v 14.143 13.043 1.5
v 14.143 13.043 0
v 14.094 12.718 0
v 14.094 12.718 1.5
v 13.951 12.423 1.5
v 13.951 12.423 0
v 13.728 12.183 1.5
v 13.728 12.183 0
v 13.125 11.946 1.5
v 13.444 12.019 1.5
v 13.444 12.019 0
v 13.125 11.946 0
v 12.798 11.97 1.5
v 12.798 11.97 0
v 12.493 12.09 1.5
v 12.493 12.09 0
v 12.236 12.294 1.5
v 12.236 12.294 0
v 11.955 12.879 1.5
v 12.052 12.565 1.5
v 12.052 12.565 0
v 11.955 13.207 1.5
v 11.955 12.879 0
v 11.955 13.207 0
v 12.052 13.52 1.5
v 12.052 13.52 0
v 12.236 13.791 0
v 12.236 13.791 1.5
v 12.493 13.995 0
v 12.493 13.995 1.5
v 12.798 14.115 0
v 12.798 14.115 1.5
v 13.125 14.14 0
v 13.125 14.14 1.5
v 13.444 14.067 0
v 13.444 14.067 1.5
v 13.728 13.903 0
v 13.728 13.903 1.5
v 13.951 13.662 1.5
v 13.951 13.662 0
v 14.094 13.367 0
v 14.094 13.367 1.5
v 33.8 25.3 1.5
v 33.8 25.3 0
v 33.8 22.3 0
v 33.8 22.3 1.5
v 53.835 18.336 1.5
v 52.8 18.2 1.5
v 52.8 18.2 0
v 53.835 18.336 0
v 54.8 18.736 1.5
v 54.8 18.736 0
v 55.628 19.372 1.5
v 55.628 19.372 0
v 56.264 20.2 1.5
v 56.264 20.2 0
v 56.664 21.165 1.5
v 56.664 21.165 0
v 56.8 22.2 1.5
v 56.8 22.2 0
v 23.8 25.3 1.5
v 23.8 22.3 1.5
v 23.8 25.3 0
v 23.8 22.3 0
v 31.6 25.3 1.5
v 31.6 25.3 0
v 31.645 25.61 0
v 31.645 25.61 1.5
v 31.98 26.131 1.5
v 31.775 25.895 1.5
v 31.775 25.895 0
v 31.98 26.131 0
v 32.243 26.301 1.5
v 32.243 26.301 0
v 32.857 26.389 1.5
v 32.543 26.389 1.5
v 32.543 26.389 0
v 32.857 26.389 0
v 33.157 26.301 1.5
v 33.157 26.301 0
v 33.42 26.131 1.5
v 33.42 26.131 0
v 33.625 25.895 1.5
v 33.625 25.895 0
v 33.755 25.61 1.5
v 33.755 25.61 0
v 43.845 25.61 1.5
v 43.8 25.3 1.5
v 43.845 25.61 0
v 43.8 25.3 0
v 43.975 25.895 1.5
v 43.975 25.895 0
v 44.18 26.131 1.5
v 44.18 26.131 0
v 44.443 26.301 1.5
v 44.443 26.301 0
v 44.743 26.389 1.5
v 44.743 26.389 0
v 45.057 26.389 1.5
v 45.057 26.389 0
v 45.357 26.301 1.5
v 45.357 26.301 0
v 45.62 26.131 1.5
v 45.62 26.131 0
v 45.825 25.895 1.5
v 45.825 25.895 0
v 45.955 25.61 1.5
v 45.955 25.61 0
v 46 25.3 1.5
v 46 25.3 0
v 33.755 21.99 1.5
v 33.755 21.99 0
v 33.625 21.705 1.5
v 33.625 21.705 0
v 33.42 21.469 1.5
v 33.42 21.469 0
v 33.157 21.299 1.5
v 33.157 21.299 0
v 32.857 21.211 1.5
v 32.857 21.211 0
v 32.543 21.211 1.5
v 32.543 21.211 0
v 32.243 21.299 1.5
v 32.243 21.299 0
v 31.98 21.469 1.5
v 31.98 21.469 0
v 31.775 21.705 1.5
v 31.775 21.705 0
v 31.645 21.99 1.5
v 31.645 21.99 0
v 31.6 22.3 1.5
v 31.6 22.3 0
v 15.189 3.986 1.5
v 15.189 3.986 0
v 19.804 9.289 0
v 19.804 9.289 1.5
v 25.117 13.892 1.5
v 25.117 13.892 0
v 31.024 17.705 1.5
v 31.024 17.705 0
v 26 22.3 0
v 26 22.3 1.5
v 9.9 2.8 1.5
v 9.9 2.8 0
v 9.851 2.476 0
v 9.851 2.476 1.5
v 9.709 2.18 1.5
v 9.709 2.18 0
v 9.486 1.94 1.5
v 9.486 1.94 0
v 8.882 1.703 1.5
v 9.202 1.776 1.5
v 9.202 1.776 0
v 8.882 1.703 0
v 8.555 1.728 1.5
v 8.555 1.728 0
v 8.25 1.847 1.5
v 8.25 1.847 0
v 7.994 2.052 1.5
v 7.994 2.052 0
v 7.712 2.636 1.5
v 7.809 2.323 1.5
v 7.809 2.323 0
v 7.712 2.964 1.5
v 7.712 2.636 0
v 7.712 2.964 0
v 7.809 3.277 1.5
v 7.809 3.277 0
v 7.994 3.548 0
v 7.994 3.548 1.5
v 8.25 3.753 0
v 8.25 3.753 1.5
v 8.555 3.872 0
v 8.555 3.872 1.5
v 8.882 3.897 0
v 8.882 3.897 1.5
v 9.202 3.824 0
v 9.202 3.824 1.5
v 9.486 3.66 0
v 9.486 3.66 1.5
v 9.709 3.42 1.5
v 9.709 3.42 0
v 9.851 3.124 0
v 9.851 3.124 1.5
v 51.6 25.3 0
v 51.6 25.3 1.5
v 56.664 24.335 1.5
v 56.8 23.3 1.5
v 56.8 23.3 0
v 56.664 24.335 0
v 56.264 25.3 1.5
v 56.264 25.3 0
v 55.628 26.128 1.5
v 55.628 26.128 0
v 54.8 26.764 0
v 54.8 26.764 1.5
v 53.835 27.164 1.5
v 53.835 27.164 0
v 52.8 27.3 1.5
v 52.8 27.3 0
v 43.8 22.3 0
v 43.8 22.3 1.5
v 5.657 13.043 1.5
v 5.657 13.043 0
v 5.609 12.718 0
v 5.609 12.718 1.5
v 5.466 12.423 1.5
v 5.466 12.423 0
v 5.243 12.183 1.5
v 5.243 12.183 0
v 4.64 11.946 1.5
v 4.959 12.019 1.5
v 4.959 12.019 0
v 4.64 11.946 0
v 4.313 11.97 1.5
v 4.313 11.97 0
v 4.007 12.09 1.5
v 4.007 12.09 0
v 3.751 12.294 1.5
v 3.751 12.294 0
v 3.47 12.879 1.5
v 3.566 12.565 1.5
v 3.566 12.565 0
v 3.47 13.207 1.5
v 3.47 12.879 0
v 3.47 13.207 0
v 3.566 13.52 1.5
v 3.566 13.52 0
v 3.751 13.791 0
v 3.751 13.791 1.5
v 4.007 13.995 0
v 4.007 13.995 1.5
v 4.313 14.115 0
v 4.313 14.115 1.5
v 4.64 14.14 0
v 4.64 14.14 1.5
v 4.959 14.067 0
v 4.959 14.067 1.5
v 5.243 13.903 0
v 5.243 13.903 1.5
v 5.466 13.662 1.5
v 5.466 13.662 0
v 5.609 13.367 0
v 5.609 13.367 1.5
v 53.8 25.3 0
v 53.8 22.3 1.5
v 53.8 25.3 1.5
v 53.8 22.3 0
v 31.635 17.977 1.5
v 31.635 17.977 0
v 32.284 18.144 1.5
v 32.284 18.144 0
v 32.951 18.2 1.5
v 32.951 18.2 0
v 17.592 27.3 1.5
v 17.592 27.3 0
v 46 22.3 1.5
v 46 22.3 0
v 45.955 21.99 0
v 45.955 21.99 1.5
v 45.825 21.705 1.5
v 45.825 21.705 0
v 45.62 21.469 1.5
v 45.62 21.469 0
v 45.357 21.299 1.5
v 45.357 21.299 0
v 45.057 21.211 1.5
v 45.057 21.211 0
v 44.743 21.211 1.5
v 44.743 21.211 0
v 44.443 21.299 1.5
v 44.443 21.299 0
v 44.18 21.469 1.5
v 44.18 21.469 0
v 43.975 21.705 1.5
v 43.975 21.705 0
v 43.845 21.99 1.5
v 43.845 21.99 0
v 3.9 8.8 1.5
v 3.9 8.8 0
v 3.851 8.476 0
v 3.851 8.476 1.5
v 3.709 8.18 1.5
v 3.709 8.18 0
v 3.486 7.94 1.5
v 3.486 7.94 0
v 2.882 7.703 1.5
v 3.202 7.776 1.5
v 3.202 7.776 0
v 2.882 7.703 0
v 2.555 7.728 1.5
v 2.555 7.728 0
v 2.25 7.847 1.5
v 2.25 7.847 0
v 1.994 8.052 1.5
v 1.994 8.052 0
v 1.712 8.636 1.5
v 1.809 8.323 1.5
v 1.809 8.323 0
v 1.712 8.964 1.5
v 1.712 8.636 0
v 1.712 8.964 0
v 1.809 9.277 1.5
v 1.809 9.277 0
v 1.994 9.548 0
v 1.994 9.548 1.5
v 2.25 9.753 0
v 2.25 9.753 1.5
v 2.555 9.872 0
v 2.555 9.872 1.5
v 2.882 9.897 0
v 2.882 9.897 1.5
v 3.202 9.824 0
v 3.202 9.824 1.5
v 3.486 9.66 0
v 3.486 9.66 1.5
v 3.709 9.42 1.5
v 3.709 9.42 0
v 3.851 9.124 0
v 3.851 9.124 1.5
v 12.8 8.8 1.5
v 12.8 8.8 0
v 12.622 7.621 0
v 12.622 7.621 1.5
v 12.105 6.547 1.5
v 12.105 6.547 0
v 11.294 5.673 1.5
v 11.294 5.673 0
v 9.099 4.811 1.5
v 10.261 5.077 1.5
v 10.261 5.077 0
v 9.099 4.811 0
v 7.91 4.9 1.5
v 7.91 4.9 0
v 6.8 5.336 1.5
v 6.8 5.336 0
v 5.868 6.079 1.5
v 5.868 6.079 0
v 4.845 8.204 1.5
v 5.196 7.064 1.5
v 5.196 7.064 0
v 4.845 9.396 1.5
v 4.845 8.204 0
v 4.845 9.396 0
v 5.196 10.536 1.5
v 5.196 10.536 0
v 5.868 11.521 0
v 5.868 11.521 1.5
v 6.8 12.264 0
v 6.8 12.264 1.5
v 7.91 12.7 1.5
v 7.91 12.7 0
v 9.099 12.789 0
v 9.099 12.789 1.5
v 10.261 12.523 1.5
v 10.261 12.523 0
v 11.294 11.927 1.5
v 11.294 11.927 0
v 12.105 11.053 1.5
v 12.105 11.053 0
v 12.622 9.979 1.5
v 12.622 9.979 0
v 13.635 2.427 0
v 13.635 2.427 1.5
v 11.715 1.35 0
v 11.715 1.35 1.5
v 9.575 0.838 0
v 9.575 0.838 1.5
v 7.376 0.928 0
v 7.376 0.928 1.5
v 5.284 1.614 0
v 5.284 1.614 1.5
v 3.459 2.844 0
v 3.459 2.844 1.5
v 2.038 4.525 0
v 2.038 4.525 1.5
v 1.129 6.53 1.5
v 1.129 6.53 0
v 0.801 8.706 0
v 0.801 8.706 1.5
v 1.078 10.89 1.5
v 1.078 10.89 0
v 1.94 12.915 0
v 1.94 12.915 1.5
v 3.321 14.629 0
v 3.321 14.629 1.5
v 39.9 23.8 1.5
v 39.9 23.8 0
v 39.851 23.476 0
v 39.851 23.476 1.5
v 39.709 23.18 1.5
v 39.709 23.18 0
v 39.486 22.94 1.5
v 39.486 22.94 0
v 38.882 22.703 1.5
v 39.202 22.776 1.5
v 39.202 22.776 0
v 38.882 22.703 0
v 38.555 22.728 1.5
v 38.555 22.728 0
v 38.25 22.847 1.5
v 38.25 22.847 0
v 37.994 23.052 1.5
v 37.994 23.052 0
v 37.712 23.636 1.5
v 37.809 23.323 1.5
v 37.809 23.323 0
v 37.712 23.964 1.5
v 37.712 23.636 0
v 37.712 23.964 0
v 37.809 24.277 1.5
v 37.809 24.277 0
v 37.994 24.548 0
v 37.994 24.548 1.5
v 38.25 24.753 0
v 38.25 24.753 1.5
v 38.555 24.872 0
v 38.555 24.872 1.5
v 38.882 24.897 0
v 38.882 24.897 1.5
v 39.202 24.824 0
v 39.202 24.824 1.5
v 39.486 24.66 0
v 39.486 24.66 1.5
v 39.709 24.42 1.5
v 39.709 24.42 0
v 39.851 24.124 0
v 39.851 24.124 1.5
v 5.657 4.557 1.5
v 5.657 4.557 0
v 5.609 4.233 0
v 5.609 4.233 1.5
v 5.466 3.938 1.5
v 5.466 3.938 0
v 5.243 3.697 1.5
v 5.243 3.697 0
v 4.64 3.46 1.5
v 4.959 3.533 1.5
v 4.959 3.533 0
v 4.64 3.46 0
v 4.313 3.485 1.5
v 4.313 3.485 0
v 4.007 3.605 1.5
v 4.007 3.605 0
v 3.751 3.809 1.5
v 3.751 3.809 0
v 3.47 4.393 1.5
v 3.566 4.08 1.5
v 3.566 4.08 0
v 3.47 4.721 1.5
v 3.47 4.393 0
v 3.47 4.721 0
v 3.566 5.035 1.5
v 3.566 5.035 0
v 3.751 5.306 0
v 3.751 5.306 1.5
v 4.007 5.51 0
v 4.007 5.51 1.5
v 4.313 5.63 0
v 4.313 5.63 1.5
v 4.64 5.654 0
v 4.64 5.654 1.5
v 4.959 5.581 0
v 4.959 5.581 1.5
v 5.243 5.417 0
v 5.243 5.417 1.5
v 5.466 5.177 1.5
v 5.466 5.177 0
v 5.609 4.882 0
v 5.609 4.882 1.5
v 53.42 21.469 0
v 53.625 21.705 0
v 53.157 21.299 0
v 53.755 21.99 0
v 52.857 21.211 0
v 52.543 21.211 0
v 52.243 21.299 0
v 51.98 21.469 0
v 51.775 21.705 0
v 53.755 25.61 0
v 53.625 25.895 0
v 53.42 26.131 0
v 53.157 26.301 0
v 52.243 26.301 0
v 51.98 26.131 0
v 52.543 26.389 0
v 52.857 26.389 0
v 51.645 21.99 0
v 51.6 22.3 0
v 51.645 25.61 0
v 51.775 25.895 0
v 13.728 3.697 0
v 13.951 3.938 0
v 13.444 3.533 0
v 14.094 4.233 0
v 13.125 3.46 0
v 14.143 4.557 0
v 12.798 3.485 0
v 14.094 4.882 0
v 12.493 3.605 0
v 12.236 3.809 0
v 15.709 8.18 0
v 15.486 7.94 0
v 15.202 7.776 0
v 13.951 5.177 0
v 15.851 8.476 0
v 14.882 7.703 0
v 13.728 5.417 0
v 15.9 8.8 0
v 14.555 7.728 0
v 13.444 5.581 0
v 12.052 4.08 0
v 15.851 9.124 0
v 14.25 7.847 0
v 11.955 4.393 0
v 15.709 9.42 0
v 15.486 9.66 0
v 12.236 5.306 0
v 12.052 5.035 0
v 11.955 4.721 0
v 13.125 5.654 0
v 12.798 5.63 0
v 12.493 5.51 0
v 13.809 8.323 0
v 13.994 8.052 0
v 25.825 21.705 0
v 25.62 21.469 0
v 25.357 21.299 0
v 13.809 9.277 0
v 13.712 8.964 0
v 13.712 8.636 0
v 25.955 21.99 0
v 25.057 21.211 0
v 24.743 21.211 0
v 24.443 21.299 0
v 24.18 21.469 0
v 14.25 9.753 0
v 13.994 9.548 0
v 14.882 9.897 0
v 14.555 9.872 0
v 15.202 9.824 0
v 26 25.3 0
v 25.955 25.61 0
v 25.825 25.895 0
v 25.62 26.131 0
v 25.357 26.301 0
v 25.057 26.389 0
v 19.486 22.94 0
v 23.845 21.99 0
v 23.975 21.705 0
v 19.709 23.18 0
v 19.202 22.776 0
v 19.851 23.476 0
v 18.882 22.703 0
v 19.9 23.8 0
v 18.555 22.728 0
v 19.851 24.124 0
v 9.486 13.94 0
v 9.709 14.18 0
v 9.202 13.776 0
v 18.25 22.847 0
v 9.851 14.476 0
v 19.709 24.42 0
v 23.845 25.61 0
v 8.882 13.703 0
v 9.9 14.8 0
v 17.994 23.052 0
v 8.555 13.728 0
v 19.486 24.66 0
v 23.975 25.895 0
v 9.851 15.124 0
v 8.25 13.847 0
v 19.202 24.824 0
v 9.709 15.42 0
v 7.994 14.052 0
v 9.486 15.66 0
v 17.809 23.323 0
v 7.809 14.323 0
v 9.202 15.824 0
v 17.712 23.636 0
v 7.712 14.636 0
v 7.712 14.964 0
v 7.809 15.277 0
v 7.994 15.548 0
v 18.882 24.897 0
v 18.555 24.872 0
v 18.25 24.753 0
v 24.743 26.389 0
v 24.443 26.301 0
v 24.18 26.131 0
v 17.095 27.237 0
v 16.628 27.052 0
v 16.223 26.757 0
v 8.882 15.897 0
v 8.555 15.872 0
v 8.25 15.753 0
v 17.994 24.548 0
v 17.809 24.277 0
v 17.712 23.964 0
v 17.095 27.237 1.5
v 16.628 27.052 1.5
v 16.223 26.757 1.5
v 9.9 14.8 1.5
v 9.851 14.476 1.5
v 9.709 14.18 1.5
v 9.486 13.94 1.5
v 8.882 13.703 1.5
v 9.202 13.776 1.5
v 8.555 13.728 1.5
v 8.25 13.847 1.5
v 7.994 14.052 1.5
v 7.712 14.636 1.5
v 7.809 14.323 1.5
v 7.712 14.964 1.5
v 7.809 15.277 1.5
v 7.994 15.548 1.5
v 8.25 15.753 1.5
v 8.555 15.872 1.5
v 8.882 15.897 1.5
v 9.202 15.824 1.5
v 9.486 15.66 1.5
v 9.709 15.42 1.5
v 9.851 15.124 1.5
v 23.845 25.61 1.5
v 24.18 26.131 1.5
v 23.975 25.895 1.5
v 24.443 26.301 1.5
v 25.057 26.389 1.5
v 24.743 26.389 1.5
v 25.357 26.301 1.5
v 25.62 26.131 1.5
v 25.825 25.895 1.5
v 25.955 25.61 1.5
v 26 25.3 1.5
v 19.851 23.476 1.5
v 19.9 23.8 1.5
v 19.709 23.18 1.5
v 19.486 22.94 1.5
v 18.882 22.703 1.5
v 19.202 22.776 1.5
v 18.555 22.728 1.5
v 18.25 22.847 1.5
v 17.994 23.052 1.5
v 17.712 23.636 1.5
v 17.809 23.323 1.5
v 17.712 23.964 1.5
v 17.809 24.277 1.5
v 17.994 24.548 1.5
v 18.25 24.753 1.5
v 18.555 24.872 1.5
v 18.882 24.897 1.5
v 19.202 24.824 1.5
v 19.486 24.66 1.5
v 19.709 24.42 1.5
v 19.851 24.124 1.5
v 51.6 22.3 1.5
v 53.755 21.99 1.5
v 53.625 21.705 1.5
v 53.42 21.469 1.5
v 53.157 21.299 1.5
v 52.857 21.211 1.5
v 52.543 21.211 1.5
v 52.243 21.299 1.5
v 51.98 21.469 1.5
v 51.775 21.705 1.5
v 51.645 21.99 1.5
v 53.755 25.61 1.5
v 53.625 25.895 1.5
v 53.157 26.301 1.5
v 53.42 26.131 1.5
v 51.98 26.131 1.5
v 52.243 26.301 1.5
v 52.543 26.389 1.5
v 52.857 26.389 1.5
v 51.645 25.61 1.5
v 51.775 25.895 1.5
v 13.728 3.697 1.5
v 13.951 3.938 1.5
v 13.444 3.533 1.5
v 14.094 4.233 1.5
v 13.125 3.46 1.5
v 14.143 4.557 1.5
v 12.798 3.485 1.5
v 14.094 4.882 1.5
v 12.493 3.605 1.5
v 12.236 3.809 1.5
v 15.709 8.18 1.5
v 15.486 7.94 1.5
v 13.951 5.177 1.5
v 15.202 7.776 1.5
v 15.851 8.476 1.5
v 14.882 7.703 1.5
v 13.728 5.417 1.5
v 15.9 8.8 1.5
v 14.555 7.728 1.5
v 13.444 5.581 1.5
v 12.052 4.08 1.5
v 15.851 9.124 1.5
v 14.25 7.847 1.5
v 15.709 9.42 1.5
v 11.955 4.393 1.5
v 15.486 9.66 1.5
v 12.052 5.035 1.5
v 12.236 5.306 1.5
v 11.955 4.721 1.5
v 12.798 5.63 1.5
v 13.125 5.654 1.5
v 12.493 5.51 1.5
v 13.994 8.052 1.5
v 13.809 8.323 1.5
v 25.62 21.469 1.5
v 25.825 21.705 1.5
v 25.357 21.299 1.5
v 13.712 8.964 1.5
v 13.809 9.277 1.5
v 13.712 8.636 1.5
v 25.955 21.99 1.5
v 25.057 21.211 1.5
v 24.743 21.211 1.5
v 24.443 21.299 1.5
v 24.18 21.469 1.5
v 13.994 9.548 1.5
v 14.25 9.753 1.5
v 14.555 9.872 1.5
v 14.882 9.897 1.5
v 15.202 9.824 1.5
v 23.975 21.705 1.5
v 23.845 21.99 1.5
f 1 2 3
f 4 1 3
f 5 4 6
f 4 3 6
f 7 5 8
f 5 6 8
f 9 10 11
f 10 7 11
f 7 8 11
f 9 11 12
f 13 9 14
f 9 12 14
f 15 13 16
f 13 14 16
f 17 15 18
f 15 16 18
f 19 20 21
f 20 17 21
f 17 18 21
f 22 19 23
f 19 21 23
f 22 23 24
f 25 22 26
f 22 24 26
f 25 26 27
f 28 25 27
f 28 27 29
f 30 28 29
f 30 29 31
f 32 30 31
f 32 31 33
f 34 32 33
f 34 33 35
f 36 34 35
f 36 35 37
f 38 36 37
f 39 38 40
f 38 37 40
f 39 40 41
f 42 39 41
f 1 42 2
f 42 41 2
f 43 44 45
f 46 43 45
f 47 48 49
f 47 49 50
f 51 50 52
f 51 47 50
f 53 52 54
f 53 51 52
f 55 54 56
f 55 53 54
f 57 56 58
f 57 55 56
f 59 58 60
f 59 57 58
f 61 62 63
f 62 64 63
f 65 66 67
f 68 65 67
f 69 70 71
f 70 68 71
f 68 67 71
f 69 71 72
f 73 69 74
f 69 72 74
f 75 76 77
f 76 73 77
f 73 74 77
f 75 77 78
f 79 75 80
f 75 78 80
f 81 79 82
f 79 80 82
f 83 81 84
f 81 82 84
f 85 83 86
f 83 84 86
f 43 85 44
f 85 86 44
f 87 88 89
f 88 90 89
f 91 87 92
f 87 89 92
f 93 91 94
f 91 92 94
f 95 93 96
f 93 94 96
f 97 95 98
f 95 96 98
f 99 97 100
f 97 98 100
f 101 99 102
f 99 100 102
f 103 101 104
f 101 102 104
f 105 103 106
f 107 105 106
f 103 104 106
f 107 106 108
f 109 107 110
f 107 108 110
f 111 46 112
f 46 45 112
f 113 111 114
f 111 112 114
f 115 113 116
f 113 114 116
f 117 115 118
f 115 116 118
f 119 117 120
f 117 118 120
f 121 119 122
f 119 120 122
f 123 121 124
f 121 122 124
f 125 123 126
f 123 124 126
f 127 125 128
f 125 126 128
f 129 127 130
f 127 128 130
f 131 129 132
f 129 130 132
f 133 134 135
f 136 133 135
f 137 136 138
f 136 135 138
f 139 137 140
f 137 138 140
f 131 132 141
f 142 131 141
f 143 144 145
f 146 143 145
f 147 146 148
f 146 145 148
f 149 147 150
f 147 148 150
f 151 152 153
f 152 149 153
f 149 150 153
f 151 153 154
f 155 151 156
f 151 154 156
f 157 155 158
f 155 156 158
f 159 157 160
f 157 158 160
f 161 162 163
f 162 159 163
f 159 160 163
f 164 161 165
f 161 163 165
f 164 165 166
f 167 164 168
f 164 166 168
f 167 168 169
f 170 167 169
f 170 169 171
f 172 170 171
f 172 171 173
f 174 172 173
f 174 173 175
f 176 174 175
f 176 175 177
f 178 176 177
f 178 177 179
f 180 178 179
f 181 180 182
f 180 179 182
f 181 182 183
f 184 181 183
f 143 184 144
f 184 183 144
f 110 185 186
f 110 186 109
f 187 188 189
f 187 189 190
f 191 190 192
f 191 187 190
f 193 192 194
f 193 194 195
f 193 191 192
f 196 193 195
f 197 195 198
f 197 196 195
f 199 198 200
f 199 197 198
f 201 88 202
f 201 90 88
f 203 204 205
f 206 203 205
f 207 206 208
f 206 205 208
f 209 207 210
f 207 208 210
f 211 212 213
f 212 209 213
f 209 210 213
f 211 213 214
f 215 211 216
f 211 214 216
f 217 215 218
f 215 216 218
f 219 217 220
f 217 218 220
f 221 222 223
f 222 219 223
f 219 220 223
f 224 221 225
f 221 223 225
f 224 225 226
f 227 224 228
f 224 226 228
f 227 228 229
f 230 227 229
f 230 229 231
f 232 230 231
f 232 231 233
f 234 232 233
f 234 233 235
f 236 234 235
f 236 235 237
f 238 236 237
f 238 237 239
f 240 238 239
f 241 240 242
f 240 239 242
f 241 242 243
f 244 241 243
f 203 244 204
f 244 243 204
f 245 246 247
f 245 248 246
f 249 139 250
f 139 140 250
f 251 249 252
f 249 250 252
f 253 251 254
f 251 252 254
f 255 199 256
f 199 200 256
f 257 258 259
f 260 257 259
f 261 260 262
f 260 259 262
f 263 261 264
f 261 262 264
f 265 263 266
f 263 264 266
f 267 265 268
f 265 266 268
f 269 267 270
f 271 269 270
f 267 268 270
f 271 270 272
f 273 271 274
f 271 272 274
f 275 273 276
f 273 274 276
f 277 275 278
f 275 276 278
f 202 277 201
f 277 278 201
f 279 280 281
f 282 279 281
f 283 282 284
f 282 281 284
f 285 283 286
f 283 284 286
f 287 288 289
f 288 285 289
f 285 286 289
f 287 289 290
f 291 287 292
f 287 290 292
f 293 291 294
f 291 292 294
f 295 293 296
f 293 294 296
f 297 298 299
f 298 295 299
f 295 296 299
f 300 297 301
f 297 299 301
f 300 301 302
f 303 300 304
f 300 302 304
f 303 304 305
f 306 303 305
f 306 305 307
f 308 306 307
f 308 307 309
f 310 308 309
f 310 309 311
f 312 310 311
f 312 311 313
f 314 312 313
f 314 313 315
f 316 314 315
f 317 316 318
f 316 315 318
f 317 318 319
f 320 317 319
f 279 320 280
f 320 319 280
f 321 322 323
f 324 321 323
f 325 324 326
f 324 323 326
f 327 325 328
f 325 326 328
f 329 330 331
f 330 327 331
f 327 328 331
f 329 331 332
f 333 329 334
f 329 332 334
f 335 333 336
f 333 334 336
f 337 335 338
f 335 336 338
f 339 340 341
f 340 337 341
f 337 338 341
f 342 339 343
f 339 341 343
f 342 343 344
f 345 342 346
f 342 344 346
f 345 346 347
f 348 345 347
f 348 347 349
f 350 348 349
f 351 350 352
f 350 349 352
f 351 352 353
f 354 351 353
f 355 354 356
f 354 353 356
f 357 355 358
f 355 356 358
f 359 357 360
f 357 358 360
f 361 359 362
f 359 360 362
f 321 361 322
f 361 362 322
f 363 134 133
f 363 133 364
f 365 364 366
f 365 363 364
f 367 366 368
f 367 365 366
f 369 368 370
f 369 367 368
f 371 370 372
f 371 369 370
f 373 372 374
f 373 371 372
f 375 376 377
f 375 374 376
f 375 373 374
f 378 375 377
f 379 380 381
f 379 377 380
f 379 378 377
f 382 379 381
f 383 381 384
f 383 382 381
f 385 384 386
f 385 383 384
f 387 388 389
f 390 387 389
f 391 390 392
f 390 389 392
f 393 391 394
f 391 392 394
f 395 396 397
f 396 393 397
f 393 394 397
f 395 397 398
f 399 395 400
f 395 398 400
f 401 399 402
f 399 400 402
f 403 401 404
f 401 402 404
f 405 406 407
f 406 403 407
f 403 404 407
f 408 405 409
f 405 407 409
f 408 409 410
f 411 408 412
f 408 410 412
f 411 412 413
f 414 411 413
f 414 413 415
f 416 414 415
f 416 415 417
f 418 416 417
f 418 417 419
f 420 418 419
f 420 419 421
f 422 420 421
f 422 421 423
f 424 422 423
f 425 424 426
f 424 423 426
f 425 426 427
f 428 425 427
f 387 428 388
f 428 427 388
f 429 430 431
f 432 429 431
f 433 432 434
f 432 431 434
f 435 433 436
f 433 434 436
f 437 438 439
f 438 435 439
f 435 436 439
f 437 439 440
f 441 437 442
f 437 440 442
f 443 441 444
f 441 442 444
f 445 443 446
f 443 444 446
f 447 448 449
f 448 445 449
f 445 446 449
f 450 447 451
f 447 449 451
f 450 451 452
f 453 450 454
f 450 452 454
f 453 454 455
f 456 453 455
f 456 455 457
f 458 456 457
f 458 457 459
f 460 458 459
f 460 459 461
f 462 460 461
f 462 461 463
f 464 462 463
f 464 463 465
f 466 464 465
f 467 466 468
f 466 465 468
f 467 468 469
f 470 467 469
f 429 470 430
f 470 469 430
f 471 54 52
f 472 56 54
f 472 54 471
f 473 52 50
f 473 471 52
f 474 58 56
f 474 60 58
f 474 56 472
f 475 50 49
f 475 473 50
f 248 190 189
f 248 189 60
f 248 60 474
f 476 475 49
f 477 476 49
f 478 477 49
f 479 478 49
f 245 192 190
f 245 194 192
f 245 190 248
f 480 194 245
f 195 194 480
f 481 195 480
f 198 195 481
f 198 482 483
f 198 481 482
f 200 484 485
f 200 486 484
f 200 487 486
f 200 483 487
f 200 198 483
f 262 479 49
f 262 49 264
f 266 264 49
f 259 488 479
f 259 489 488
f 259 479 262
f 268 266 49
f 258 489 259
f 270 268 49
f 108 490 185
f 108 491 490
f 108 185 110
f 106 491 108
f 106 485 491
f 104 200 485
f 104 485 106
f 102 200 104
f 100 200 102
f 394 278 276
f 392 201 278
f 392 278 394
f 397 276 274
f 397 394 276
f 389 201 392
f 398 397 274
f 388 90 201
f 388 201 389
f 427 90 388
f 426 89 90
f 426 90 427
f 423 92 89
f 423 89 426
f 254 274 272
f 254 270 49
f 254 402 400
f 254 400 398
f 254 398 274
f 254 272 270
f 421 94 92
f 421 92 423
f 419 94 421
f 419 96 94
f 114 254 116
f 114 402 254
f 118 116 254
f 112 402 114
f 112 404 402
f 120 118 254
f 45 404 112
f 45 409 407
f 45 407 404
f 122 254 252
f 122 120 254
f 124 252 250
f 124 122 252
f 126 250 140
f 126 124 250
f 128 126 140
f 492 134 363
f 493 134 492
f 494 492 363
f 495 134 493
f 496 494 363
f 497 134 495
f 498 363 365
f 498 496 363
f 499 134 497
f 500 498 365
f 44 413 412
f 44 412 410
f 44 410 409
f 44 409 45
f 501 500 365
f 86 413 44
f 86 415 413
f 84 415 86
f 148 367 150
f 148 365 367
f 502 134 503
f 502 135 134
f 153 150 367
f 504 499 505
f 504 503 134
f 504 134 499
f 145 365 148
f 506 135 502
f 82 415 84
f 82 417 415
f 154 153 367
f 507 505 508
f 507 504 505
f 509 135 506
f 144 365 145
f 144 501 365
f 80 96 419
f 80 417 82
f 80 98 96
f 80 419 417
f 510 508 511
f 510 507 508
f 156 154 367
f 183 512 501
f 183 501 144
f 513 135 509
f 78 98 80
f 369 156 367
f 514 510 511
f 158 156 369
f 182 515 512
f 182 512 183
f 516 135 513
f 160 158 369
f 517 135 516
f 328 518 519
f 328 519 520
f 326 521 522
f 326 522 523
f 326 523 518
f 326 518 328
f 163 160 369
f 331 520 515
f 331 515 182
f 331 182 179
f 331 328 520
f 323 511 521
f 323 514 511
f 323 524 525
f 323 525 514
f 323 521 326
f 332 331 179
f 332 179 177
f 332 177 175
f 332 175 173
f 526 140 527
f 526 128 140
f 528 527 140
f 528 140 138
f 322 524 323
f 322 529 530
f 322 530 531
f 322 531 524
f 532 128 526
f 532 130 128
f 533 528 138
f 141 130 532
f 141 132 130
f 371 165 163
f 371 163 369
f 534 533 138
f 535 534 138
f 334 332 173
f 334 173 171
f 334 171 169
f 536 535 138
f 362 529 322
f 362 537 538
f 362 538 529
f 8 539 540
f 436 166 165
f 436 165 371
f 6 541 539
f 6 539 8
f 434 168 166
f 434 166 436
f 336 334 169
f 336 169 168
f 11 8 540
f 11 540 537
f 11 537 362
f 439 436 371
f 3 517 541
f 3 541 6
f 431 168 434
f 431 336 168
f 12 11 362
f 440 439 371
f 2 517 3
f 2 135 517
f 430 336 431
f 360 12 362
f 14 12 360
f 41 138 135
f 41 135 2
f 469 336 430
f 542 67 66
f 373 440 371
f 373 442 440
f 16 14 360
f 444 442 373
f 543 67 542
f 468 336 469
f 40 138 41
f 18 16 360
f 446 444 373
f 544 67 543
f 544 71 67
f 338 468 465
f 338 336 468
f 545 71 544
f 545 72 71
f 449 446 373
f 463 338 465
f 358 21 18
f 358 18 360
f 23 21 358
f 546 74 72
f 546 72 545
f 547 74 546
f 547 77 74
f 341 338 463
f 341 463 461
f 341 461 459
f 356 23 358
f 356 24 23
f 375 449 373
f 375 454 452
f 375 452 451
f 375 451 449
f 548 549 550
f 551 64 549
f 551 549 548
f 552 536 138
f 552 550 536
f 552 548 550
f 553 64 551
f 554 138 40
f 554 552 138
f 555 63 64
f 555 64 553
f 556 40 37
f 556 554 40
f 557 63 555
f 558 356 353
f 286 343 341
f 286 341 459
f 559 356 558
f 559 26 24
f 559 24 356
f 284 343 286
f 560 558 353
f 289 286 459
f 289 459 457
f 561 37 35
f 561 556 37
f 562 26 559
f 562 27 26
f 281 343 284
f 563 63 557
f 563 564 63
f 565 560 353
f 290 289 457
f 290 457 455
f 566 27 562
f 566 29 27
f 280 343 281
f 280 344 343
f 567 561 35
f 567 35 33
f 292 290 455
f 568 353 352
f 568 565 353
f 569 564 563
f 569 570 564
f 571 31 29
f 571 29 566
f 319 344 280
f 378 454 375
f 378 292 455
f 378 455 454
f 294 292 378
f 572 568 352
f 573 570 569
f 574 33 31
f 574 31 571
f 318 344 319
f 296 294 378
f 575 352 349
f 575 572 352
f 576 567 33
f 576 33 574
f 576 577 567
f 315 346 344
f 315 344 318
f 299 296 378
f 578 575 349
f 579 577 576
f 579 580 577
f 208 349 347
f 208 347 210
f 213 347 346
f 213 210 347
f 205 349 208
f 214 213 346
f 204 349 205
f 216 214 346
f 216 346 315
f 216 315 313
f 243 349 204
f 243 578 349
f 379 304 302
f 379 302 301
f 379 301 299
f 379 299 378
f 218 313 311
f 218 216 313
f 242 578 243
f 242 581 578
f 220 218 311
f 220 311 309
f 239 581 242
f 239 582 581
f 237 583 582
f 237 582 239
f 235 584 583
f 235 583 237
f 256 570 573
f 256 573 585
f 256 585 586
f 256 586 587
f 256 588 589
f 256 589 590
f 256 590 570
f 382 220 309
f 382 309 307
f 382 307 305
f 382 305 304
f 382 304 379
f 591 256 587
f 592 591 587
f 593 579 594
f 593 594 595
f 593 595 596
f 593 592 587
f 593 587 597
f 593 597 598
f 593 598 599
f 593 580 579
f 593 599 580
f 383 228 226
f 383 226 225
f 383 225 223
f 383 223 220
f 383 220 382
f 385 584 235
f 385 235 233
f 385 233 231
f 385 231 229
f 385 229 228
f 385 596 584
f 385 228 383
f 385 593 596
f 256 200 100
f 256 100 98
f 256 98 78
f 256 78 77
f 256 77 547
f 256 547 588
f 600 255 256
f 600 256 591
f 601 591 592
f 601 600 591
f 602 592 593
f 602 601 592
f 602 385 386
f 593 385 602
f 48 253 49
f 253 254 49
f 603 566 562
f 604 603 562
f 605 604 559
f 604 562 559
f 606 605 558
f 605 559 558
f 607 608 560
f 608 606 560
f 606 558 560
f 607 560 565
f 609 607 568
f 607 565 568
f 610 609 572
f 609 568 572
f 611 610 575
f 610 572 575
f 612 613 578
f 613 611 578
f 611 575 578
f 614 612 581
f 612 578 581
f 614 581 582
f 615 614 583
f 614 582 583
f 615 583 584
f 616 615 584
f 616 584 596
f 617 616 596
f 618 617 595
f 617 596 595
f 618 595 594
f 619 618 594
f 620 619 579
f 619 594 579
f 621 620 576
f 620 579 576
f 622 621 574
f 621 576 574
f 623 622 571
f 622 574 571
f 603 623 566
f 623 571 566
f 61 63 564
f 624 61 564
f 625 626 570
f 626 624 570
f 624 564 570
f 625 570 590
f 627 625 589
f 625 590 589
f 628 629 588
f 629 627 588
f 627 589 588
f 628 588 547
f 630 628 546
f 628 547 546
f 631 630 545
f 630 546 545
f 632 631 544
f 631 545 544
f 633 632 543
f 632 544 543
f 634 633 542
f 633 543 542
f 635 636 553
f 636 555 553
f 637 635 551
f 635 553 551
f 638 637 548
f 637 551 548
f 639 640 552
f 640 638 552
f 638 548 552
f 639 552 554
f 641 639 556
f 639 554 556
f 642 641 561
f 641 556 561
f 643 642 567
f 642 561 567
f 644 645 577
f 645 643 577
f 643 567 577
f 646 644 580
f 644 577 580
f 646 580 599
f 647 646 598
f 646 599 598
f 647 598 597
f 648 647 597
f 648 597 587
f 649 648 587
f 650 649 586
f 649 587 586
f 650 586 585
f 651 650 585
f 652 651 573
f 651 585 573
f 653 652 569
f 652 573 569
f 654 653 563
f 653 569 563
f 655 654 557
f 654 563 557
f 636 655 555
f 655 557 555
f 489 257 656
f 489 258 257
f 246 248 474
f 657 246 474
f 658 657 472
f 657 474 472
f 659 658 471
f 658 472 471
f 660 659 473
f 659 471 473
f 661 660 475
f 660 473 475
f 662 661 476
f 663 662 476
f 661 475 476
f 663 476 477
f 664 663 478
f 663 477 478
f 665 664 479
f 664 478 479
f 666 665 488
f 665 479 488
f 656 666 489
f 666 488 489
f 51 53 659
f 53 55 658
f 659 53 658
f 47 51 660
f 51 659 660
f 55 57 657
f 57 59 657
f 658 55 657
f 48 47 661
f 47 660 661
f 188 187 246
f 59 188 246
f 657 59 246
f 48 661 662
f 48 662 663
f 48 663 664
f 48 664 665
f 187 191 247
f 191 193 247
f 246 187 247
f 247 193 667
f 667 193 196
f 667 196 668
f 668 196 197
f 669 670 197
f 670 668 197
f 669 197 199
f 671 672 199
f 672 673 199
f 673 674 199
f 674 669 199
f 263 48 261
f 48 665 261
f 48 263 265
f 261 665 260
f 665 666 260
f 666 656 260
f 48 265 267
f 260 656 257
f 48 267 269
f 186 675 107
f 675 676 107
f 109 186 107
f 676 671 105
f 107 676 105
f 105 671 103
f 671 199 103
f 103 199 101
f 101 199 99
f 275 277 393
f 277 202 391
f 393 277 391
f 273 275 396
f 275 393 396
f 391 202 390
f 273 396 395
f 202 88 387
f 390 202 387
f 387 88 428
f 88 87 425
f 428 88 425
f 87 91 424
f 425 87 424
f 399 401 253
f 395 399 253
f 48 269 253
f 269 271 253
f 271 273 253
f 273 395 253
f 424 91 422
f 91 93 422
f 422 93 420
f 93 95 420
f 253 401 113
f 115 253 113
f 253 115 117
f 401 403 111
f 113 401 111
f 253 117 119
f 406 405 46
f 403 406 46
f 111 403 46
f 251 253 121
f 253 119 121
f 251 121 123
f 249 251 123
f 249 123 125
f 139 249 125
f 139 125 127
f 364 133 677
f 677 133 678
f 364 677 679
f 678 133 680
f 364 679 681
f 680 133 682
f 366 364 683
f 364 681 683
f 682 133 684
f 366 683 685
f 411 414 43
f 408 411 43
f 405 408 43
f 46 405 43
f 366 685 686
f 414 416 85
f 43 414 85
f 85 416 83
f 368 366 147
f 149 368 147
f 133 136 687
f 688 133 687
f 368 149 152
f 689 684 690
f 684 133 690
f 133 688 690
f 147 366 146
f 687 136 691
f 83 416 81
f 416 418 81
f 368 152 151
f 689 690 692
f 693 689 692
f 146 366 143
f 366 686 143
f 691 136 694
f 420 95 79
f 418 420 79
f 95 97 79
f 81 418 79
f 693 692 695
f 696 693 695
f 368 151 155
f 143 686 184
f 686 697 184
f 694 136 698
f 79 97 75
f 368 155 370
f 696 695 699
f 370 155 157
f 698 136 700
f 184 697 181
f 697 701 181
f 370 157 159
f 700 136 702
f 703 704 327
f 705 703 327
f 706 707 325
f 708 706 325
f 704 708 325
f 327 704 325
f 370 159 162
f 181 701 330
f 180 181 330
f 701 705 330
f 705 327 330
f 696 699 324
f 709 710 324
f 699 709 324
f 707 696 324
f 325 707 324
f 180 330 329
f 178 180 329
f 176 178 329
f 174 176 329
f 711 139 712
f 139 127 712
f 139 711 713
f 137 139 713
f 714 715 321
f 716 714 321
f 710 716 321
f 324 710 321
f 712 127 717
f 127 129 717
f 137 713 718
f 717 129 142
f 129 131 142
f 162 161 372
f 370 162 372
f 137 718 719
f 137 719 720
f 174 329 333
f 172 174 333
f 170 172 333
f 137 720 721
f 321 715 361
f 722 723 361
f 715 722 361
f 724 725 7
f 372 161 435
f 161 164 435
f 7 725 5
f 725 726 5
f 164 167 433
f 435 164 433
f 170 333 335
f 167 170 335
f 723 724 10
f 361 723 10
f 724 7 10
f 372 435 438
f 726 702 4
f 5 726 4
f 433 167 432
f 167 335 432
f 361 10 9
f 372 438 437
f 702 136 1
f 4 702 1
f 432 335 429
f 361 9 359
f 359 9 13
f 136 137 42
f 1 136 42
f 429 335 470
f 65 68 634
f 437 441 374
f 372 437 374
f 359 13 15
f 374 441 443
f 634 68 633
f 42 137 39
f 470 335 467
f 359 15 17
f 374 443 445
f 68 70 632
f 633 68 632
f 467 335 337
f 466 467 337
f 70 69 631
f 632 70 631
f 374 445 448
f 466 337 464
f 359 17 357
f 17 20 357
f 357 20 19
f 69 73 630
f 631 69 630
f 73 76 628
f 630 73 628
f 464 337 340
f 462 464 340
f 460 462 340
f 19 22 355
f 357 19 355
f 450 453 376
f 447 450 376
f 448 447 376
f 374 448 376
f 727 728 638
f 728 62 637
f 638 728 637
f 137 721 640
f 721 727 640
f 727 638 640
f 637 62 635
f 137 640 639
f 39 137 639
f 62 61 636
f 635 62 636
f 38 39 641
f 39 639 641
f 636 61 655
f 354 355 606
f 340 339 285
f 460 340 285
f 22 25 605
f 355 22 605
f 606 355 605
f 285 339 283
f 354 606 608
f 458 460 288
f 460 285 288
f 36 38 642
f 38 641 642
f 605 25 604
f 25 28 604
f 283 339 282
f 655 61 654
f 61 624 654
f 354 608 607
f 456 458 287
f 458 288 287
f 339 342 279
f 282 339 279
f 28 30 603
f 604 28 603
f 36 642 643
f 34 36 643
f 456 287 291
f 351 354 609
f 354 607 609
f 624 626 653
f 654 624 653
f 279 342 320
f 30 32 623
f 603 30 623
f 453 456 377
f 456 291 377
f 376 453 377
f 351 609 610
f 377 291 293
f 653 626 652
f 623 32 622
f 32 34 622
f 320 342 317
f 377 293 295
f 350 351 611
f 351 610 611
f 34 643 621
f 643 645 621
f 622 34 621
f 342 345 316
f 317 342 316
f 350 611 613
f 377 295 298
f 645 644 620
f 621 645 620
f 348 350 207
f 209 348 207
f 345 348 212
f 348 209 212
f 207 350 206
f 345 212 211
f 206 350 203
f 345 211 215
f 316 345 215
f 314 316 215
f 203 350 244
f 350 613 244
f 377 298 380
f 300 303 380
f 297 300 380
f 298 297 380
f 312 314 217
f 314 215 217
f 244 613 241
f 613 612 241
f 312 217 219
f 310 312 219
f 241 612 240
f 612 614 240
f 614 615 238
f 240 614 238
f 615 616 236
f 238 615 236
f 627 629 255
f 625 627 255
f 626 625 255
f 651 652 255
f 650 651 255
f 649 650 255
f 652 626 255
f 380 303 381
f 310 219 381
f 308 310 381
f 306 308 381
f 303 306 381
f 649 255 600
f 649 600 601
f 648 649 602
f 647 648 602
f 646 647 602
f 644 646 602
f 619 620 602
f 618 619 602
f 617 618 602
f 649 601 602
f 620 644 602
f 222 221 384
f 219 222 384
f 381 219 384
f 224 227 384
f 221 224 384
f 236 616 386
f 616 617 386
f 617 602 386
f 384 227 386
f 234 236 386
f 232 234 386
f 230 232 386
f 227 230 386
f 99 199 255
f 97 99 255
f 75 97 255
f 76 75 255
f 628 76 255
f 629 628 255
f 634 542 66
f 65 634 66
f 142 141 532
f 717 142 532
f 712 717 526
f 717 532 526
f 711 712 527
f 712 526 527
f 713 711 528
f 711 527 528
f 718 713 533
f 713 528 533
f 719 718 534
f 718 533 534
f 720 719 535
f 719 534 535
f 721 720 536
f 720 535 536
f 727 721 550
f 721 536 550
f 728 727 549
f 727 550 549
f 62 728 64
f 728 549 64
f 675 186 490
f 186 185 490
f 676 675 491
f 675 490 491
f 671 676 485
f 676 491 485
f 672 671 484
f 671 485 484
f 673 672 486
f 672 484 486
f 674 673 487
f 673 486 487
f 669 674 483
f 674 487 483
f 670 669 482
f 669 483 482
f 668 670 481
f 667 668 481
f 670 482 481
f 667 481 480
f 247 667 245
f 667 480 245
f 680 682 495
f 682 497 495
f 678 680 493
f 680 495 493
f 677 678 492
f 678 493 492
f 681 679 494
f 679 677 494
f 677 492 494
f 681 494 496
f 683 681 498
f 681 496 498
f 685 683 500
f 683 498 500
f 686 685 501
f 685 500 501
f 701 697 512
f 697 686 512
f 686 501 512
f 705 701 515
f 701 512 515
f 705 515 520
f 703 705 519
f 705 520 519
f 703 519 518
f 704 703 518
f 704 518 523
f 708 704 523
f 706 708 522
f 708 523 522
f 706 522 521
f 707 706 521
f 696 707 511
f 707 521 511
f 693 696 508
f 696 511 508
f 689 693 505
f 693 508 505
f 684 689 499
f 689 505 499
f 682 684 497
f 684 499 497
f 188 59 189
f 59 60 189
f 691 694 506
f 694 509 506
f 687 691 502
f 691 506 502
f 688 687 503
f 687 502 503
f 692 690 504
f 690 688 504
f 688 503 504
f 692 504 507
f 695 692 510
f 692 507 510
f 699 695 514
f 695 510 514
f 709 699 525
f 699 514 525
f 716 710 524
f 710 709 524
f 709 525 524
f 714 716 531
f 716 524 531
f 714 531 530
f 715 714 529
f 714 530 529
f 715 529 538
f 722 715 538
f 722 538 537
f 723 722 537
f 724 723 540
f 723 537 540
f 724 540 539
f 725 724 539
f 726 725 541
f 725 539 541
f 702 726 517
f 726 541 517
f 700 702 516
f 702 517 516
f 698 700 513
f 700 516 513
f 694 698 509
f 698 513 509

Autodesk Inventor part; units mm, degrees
ref_plane "YZ Plane" through (0, 0, 0) normal (1, 0, 0) x (0, 1, 0)
ref_plane "XZ Plane" through (0, 0, 0) normal (0, 1, 0) x (-1, 0, 0)
ref_plane "XY Plane" through (0, 0, 0) normal (0, 0, 1) x (1, 0, 0)
sketch "スケッチ1" plane through (0, 0, 0) normal (0, 0, 1) x (1, 0, 0)
  circle A0 centre (8.8, 8.8) radius 8 projected
  circle A1 centre (2.8, 8.8) radius 0.825 projected
  circle A2 centre (4.5574, 4.5574) radius 0.825 projected
  circle A3 centre (8.8, 2.8) radius 0.825 projected
  circle A4 centre (13.0426, 4.5574) radius 0.825 projected
  circle A5 centre (14.8, 8.8) radius 0.825 projected
  circle A6 centre (13.0426, 13.0426) radius 0.825 projected
  circle A7 centre (8.8, 14.8) radius 0.825 projected
  circle A8 centre (4.5574, 13.0426) radius 0.825 projected
  circle A9 centre (8.8, 8.8) radius 4 projected
  circle A10 centre (8.8, 14.8) radius 1.1
  circle A11 centre (4.5574, 13.0426) radius 1.1
  circle A12 centre (2.8, 8.8) radius 1.1
  circle A13 centre (4.5574, 4.5574) radius 1.1
  circle A14 centre (8.8, 2.8) radius 1.1
  circle A15 centre (13.0426, 4.5574) radius 1.1
  circle A16 centre (14.8, 8.8) radius 1.1
  circle A17 centre (13.0426, 13.0426) radius 1.1
  line L0 (3.3206, 14.6289) -> (16.8, 27.3)
  line L1 (23.8, 25.3) -> (33.8, 25.3)
  line L2 (33.8, 25.3) -> (33.8, 22.3)
  line L3 (33.8, 22.3) -> (23.8, 22.3)
  line L4 (23.8, 22.3) -> (23.8, 25.3)
  circle A18 centre (24.9, 25.3) radius 1.1
  line L5 (28.8, 25.3) -> (28.8, 22.3) construction
  line L6 (28.8, 23.8) -> (23.8, 23.8) construction
  circle A19 centre (24.9, 22.3) radius 1.1
  circle A20 centre (32.7, 25.3) radius 1.1
  circle A21 centre (32.7, 22.3) radius 1.1
  circle A22 centre (38.8, 23.8) radius 1.1
  circle A23 centre (18.8, 23.8) radius 1.1
  line L7 (16.8, 27.3) -> (40.8, 27.3)
  line L8 (40.8, 27.3) -> (40.8, 21.8)
  arc A24 (40.8, 21.8) -> (15.1891, 3.9855) centre (55.1209, -26.1052) ccw
  point P0 (0, 0)
  point P1 (31.6, 22.3)
  point P2 (26, 22.3)
  point P3 (26, 25.3)
  point P4 (31.6, 25.3)
  dimension "d7" = 2.2
  dimension "d0" = 2.2
  dimension "d3" = 360
  dimension "d5" = 10
  dimension "d6" = 3
  dimension "d8" = 2.2
  dimension "d9" = 5
  dimension "d10" = 2
  dimension "d11" = 2
  dimension "d12" = 2
  dimension "d13" = 20
  dimension "d14" = 2
  dimension "d15" = 15
  dimension "d16" = 50
extrude "押し出し1" add sketch "スケッチ1" along normal blind 1.5 contours A0 | A0 L0 L7 L8 A24
fillet "フィレット1" radius 2 3 edges at (40.8, 27.3, 0.75) (40.8, 21.8, 0.75) (16.8, 27.3, 0.75)
sketch "スケッチ4" plane through (0, 0, 0) normal (0, 0, -1) x (-1, 0, 0)
  line L0 (-53.8, 25.3) -> (-43.8, 25.3)
  line L1 (-43.8, 25.3) -> (-43.8, 22.3)
  line L2 (-43.8, 22.3) -> (-53.8, 22.3)
  line L3 (-53.8, 22.3) -> (-53.8, 25.3)
  circle A0 centre (-38.8, 23.8) radius 1.1 projected
  circle A1 centre (-52.7, 25.3) radius 1.1
  line L4 (-48.8, 25.3) -> (-48.8, 23.8) construction
  line L5 (-48.8, 23.8) -> (-53.8, 23.8) construction
  circle A2 centre (-44.9, 25.3) radius 1.1
  circle A3 centre (-52.7, 22.3) radius 1.1
  circle A4 centre (-44.9, 22.3) radius 1.1
  arc A5 (-15.1891, 3.9855) -> (-39.4277, 21.3682) centre (-55.1209, -26.1052) ccw projected
  line L6 (-31.9466, 18.2) -> (-56.8, 18.2)
  line L7 (-56.8, 18.2) -> (-56.8, 27.3)
  line L8 (-38.8, 27.3) -> (-17.5925, 27.3) construction
  line L9 (-56.8, 27.3) -> (-38.8, 27.3)
  arc A6 (-16.2226, 26.7572) -> (-17.5925, 27.3) centre (-17.5925, 25.3) ccw projected
  line L10 (-38.8, 27.3) -> (-17.5925, 27.3) projected
  arc A7 (-38.8, 27.3) -> (-40.8, 25.3) centre (-38.8, 25.3) ccw projected
  line L11 (-40.8, 23.2671) -> (-40.8, 25.3) projected
  arc A8 (-40.8, 23.2671) -> (-39.4277, 21.3682) centre (-38.8, 23.2671) ccw projected
  arc A9 (-15.1891, 3.9855) -> (-39.4277, 21.3682) centre (-55.1209, -26.1052) ccw construction
  arc A10 (-15.1891, 3.9855) -> (-3.3206, 14.6289) centre (-8.8, 8.8) ccw projected
  line L12 (-16.2226, 26.7572) -> (-3.3206, 14.6289) projected
  circle A11 centre (-8.8, 8.8) radius 4 projected
  circle A12 centre (-8.8, 14.8) radius 1.1 projected
  circle A13 centre (-4.5574, 13.0426) radius 1.1 projected
  circle A14 centre (-2.8, 8.8) radius 1.1 projected
  circle A15 centre (-4.5574, 4.5574) radius 1.1 projected
  circle A16 centre (-8.8, 2.8) radius 1.1 projected
  circle A17 centre (-13.0426, 4.5574) radius 1.1 projected
  circle A18 centre (-14.8, 8.8) radius 1.1 projected
  circle A19 centre (-13.0426, 13.0426) radius 1.1 projected
  circle A20 centre (-38.8, 23.8) radius 1.1 projected
  circle A21 centre (-18.8, 23.8) radius 1.1 projected
  line L13 (-33.8, 25.3) -> (-33.8, 22.3) projected
  arc A22 (-31.6, 25.3) -> (-33.8, 25.3) centre (-32.7, 25.3) ccw projected
  line L14 (-26, 25.3) -> (-31.6, 25.3) projected
  arc A23 (-23.8, 25.3) -> (-26, 25.3) centre (-24.9, 25.3) ccw projected
  line L15 (-23.8, 22.3) -> (-23.8, 25.3) projected
  arc A24 (-26, 22.3) -> (-23.8, 22.3) centre (-24.9, 22.3) ccw projected
  line L16 (-31.6, 22.3) -> (-26, 22.3) projected
  arc A25 (-33.8, 22.3) -> (-31.6, 22.3) centre (-32.7, 22.3) ccw projected
  point P0 (0, 0)
  point P1 (-43.8, 23.8)
  point P2 (-39.4277, 21.3682)
  point P3 (-46, 22.3)
  point P4 (-51.6, 22.3)
  point P5 (-51.6, 25.3)
  point P6 (-46, 25.3)
  dimension "d32" = 2.2
  dimension "d30" = 10
  dimension "d31" = 5
  dimension "d33" = 3
  dimension "d34" = 3
extrude "押し出し4" add sketch "スケッチ4" against normal up to surface (1.5 mm away) contours L6 L7 L9 A7 L11 A8 A5
fillet "フィレット4" radius 4 3 edges at (56.8, 18.2, 0.75) (56.8, 27.3, 0.75) (31.9466, 18.2, 0.75)
properties part number "tesaki_new" material "アルミニウム 2014-T4"
